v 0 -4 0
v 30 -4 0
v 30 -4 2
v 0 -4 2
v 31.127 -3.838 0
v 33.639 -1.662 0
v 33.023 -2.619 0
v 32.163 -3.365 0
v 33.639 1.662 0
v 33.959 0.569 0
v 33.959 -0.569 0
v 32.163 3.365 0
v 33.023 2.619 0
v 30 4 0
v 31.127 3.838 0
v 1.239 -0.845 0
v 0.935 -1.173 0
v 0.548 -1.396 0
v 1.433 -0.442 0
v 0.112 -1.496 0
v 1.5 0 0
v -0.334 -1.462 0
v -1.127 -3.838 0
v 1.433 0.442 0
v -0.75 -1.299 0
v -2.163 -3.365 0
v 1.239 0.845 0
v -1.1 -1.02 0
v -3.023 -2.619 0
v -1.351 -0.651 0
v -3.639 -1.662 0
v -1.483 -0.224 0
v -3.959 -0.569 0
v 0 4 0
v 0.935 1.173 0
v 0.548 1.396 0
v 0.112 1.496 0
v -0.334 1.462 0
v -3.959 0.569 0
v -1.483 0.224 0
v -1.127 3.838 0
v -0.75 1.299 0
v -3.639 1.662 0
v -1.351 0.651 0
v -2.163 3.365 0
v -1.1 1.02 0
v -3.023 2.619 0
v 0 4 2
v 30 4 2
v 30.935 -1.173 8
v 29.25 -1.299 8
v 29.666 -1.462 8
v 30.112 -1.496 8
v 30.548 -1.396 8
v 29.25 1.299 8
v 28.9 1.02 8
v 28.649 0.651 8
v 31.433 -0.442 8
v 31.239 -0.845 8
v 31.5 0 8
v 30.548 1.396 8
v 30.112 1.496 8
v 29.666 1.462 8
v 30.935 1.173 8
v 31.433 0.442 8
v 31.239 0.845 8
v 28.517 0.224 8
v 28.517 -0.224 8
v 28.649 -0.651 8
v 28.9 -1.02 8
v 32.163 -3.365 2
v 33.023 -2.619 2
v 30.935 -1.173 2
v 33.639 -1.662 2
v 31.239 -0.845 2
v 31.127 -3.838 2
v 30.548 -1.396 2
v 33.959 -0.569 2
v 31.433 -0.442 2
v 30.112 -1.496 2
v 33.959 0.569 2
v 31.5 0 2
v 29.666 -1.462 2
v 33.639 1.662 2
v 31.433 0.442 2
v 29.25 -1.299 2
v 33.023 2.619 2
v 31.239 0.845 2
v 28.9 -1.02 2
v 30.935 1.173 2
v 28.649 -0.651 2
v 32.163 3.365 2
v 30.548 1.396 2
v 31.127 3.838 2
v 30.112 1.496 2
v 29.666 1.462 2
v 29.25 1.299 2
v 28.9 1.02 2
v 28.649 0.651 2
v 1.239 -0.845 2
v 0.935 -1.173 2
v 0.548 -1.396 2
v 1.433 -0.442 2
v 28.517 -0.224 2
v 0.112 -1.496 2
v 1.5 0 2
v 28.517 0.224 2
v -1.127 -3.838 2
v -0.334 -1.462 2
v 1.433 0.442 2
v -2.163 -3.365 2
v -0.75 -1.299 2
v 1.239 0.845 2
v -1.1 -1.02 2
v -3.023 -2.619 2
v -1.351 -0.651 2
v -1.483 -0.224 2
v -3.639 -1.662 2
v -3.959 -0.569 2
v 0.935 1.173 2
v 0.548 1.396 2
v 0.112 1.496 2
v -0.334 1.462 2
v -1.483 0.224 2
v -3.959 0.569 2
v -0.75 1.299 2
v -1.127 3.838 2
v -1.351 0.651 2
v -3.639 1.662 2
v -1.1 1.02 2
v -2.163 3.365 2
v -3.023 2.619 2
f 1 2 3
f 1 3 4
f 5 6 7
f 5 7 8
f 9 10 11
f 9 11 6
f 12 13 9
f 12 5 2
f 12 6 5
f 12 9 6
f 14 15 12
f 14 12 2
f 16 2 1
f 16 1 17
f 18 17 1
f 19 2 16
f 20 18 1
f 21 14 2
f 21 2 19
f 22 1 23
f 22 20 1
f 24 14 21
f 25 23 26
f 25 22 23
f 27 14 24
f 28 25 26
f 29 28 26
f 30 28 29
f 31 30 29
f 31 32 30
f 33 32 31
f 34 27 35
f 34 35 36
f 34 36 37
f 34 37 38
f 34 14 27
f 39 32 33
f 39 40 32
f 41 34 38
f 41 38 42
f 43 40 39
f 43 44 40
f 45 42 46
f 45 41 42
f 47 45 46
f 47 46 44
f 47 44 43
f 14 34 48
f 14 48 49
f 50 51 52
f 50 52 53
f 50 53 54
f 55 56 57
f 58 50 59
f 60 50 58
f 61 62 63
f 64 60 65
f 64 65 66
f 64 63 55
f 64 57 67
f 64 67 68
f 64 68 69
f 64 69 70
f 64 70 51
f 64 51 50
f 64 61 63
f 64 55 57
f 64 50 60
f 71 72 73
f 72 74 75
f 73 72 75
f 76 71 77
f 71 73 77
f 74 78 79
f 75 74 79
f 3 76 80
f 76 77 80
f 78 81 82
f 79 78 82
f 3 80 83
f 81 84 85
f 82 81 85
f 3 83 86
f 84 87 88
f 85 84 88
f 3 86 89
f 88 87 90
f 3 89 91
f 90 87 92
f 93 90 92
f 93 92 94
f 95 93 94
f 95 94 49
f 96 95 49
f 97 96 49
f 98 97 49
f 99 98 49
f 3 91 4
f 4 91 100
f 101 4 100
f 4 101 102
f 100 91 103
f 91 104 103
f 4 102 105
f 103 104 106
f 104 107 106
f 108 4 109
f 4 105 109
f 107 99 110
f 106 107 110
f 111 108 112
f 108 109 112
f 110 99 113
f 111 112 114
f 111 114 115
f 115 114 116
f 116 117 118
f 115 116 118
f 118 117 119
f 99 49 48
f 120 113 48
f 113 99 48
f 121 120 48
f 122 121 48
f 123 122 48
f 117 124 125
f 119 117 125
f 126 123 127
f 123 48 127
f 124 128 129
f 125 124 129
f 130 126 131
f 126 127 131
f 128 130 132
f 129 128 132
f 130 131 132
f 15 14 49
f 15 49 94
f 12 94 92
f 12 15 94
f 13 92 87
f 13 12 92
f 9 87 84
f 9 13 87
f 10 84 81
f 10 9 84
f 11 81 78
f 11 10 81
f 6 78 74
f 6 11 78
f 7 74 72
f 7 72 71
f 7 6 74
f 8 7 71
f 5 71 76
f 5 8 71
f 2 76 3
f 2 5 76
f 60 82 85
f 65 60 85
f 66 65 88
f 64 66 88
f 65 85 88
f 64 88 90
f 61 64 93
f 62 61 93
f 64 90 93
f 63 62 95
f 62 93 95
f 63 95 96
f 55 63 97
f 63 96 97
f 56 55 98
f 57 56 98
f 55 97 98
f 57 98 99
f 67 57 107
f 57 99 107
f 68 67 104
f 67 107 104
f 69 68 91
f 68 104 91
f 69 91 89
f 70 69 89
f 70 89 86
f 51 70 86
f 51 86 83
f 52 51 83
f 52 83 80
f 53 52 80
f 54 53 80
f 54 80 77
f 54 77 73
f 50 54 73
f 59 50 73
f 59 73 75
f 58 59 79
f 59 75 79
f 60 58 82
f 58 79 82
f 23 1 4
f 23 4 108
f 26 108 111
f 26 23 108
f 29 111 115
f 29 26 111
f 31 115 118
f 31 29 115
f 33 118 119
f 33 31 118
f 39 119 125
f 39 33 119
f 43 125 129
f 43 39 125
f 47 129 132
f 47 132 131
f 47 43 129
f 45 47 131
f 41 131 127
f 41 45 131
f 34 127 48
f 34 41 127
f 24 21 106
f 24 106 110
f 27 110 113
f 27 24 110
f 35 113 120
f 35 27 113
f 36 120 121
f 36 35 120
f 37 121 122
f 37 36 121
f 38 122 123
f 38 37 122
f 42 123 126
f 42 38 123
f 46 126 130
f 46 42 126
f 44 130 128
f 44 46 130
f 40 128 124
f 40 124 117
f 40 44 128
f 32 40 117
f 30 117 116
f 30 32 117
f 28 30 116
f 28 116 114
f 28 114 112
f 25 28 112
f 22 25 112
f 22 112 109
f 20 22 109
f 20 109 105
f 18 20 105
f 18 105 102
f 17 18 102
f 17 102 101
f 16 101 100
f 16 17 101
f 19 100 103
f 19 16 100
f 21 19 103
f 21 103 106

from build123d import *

# Parameters (mm, degrees)
SKETCH1_R           = 1.5
BOSS_EXTRUDE1_DEPTH = 2
SKETCH2_R           = 1.5
BOSS_EXTRUDE2_DEPTH = 6


with BuildPart() as part:
    # Sketch1 → Boss-Extrude1 (new body)
    with BuildSketch(Plane.XY):
        with BuildLine():
            Line((0, 4), (30, 4))
            ThreePointArc((30, 4), (34, 0), (30, -4))
            Line((30, -4), (0, -4))
            ThreePointArc((0, -4), (-4, 0), (0, 4))
        make_face()
        Circle(SKETCH1_R, mode=Mode.SUBTRACT)
    extrude(amount=BOSS_EXTRUDE1_DEPTH)

    # Sketch2 → Boss-Extrude2 (add)
    with BuildSketch(Plane.XY.offset(2)):
        with Locations((30, 0)):
            Circle(SKETCH2_R)
    extrude(amount=BOSS_EXTRUDE2_DEPTH)


solid = part.part
